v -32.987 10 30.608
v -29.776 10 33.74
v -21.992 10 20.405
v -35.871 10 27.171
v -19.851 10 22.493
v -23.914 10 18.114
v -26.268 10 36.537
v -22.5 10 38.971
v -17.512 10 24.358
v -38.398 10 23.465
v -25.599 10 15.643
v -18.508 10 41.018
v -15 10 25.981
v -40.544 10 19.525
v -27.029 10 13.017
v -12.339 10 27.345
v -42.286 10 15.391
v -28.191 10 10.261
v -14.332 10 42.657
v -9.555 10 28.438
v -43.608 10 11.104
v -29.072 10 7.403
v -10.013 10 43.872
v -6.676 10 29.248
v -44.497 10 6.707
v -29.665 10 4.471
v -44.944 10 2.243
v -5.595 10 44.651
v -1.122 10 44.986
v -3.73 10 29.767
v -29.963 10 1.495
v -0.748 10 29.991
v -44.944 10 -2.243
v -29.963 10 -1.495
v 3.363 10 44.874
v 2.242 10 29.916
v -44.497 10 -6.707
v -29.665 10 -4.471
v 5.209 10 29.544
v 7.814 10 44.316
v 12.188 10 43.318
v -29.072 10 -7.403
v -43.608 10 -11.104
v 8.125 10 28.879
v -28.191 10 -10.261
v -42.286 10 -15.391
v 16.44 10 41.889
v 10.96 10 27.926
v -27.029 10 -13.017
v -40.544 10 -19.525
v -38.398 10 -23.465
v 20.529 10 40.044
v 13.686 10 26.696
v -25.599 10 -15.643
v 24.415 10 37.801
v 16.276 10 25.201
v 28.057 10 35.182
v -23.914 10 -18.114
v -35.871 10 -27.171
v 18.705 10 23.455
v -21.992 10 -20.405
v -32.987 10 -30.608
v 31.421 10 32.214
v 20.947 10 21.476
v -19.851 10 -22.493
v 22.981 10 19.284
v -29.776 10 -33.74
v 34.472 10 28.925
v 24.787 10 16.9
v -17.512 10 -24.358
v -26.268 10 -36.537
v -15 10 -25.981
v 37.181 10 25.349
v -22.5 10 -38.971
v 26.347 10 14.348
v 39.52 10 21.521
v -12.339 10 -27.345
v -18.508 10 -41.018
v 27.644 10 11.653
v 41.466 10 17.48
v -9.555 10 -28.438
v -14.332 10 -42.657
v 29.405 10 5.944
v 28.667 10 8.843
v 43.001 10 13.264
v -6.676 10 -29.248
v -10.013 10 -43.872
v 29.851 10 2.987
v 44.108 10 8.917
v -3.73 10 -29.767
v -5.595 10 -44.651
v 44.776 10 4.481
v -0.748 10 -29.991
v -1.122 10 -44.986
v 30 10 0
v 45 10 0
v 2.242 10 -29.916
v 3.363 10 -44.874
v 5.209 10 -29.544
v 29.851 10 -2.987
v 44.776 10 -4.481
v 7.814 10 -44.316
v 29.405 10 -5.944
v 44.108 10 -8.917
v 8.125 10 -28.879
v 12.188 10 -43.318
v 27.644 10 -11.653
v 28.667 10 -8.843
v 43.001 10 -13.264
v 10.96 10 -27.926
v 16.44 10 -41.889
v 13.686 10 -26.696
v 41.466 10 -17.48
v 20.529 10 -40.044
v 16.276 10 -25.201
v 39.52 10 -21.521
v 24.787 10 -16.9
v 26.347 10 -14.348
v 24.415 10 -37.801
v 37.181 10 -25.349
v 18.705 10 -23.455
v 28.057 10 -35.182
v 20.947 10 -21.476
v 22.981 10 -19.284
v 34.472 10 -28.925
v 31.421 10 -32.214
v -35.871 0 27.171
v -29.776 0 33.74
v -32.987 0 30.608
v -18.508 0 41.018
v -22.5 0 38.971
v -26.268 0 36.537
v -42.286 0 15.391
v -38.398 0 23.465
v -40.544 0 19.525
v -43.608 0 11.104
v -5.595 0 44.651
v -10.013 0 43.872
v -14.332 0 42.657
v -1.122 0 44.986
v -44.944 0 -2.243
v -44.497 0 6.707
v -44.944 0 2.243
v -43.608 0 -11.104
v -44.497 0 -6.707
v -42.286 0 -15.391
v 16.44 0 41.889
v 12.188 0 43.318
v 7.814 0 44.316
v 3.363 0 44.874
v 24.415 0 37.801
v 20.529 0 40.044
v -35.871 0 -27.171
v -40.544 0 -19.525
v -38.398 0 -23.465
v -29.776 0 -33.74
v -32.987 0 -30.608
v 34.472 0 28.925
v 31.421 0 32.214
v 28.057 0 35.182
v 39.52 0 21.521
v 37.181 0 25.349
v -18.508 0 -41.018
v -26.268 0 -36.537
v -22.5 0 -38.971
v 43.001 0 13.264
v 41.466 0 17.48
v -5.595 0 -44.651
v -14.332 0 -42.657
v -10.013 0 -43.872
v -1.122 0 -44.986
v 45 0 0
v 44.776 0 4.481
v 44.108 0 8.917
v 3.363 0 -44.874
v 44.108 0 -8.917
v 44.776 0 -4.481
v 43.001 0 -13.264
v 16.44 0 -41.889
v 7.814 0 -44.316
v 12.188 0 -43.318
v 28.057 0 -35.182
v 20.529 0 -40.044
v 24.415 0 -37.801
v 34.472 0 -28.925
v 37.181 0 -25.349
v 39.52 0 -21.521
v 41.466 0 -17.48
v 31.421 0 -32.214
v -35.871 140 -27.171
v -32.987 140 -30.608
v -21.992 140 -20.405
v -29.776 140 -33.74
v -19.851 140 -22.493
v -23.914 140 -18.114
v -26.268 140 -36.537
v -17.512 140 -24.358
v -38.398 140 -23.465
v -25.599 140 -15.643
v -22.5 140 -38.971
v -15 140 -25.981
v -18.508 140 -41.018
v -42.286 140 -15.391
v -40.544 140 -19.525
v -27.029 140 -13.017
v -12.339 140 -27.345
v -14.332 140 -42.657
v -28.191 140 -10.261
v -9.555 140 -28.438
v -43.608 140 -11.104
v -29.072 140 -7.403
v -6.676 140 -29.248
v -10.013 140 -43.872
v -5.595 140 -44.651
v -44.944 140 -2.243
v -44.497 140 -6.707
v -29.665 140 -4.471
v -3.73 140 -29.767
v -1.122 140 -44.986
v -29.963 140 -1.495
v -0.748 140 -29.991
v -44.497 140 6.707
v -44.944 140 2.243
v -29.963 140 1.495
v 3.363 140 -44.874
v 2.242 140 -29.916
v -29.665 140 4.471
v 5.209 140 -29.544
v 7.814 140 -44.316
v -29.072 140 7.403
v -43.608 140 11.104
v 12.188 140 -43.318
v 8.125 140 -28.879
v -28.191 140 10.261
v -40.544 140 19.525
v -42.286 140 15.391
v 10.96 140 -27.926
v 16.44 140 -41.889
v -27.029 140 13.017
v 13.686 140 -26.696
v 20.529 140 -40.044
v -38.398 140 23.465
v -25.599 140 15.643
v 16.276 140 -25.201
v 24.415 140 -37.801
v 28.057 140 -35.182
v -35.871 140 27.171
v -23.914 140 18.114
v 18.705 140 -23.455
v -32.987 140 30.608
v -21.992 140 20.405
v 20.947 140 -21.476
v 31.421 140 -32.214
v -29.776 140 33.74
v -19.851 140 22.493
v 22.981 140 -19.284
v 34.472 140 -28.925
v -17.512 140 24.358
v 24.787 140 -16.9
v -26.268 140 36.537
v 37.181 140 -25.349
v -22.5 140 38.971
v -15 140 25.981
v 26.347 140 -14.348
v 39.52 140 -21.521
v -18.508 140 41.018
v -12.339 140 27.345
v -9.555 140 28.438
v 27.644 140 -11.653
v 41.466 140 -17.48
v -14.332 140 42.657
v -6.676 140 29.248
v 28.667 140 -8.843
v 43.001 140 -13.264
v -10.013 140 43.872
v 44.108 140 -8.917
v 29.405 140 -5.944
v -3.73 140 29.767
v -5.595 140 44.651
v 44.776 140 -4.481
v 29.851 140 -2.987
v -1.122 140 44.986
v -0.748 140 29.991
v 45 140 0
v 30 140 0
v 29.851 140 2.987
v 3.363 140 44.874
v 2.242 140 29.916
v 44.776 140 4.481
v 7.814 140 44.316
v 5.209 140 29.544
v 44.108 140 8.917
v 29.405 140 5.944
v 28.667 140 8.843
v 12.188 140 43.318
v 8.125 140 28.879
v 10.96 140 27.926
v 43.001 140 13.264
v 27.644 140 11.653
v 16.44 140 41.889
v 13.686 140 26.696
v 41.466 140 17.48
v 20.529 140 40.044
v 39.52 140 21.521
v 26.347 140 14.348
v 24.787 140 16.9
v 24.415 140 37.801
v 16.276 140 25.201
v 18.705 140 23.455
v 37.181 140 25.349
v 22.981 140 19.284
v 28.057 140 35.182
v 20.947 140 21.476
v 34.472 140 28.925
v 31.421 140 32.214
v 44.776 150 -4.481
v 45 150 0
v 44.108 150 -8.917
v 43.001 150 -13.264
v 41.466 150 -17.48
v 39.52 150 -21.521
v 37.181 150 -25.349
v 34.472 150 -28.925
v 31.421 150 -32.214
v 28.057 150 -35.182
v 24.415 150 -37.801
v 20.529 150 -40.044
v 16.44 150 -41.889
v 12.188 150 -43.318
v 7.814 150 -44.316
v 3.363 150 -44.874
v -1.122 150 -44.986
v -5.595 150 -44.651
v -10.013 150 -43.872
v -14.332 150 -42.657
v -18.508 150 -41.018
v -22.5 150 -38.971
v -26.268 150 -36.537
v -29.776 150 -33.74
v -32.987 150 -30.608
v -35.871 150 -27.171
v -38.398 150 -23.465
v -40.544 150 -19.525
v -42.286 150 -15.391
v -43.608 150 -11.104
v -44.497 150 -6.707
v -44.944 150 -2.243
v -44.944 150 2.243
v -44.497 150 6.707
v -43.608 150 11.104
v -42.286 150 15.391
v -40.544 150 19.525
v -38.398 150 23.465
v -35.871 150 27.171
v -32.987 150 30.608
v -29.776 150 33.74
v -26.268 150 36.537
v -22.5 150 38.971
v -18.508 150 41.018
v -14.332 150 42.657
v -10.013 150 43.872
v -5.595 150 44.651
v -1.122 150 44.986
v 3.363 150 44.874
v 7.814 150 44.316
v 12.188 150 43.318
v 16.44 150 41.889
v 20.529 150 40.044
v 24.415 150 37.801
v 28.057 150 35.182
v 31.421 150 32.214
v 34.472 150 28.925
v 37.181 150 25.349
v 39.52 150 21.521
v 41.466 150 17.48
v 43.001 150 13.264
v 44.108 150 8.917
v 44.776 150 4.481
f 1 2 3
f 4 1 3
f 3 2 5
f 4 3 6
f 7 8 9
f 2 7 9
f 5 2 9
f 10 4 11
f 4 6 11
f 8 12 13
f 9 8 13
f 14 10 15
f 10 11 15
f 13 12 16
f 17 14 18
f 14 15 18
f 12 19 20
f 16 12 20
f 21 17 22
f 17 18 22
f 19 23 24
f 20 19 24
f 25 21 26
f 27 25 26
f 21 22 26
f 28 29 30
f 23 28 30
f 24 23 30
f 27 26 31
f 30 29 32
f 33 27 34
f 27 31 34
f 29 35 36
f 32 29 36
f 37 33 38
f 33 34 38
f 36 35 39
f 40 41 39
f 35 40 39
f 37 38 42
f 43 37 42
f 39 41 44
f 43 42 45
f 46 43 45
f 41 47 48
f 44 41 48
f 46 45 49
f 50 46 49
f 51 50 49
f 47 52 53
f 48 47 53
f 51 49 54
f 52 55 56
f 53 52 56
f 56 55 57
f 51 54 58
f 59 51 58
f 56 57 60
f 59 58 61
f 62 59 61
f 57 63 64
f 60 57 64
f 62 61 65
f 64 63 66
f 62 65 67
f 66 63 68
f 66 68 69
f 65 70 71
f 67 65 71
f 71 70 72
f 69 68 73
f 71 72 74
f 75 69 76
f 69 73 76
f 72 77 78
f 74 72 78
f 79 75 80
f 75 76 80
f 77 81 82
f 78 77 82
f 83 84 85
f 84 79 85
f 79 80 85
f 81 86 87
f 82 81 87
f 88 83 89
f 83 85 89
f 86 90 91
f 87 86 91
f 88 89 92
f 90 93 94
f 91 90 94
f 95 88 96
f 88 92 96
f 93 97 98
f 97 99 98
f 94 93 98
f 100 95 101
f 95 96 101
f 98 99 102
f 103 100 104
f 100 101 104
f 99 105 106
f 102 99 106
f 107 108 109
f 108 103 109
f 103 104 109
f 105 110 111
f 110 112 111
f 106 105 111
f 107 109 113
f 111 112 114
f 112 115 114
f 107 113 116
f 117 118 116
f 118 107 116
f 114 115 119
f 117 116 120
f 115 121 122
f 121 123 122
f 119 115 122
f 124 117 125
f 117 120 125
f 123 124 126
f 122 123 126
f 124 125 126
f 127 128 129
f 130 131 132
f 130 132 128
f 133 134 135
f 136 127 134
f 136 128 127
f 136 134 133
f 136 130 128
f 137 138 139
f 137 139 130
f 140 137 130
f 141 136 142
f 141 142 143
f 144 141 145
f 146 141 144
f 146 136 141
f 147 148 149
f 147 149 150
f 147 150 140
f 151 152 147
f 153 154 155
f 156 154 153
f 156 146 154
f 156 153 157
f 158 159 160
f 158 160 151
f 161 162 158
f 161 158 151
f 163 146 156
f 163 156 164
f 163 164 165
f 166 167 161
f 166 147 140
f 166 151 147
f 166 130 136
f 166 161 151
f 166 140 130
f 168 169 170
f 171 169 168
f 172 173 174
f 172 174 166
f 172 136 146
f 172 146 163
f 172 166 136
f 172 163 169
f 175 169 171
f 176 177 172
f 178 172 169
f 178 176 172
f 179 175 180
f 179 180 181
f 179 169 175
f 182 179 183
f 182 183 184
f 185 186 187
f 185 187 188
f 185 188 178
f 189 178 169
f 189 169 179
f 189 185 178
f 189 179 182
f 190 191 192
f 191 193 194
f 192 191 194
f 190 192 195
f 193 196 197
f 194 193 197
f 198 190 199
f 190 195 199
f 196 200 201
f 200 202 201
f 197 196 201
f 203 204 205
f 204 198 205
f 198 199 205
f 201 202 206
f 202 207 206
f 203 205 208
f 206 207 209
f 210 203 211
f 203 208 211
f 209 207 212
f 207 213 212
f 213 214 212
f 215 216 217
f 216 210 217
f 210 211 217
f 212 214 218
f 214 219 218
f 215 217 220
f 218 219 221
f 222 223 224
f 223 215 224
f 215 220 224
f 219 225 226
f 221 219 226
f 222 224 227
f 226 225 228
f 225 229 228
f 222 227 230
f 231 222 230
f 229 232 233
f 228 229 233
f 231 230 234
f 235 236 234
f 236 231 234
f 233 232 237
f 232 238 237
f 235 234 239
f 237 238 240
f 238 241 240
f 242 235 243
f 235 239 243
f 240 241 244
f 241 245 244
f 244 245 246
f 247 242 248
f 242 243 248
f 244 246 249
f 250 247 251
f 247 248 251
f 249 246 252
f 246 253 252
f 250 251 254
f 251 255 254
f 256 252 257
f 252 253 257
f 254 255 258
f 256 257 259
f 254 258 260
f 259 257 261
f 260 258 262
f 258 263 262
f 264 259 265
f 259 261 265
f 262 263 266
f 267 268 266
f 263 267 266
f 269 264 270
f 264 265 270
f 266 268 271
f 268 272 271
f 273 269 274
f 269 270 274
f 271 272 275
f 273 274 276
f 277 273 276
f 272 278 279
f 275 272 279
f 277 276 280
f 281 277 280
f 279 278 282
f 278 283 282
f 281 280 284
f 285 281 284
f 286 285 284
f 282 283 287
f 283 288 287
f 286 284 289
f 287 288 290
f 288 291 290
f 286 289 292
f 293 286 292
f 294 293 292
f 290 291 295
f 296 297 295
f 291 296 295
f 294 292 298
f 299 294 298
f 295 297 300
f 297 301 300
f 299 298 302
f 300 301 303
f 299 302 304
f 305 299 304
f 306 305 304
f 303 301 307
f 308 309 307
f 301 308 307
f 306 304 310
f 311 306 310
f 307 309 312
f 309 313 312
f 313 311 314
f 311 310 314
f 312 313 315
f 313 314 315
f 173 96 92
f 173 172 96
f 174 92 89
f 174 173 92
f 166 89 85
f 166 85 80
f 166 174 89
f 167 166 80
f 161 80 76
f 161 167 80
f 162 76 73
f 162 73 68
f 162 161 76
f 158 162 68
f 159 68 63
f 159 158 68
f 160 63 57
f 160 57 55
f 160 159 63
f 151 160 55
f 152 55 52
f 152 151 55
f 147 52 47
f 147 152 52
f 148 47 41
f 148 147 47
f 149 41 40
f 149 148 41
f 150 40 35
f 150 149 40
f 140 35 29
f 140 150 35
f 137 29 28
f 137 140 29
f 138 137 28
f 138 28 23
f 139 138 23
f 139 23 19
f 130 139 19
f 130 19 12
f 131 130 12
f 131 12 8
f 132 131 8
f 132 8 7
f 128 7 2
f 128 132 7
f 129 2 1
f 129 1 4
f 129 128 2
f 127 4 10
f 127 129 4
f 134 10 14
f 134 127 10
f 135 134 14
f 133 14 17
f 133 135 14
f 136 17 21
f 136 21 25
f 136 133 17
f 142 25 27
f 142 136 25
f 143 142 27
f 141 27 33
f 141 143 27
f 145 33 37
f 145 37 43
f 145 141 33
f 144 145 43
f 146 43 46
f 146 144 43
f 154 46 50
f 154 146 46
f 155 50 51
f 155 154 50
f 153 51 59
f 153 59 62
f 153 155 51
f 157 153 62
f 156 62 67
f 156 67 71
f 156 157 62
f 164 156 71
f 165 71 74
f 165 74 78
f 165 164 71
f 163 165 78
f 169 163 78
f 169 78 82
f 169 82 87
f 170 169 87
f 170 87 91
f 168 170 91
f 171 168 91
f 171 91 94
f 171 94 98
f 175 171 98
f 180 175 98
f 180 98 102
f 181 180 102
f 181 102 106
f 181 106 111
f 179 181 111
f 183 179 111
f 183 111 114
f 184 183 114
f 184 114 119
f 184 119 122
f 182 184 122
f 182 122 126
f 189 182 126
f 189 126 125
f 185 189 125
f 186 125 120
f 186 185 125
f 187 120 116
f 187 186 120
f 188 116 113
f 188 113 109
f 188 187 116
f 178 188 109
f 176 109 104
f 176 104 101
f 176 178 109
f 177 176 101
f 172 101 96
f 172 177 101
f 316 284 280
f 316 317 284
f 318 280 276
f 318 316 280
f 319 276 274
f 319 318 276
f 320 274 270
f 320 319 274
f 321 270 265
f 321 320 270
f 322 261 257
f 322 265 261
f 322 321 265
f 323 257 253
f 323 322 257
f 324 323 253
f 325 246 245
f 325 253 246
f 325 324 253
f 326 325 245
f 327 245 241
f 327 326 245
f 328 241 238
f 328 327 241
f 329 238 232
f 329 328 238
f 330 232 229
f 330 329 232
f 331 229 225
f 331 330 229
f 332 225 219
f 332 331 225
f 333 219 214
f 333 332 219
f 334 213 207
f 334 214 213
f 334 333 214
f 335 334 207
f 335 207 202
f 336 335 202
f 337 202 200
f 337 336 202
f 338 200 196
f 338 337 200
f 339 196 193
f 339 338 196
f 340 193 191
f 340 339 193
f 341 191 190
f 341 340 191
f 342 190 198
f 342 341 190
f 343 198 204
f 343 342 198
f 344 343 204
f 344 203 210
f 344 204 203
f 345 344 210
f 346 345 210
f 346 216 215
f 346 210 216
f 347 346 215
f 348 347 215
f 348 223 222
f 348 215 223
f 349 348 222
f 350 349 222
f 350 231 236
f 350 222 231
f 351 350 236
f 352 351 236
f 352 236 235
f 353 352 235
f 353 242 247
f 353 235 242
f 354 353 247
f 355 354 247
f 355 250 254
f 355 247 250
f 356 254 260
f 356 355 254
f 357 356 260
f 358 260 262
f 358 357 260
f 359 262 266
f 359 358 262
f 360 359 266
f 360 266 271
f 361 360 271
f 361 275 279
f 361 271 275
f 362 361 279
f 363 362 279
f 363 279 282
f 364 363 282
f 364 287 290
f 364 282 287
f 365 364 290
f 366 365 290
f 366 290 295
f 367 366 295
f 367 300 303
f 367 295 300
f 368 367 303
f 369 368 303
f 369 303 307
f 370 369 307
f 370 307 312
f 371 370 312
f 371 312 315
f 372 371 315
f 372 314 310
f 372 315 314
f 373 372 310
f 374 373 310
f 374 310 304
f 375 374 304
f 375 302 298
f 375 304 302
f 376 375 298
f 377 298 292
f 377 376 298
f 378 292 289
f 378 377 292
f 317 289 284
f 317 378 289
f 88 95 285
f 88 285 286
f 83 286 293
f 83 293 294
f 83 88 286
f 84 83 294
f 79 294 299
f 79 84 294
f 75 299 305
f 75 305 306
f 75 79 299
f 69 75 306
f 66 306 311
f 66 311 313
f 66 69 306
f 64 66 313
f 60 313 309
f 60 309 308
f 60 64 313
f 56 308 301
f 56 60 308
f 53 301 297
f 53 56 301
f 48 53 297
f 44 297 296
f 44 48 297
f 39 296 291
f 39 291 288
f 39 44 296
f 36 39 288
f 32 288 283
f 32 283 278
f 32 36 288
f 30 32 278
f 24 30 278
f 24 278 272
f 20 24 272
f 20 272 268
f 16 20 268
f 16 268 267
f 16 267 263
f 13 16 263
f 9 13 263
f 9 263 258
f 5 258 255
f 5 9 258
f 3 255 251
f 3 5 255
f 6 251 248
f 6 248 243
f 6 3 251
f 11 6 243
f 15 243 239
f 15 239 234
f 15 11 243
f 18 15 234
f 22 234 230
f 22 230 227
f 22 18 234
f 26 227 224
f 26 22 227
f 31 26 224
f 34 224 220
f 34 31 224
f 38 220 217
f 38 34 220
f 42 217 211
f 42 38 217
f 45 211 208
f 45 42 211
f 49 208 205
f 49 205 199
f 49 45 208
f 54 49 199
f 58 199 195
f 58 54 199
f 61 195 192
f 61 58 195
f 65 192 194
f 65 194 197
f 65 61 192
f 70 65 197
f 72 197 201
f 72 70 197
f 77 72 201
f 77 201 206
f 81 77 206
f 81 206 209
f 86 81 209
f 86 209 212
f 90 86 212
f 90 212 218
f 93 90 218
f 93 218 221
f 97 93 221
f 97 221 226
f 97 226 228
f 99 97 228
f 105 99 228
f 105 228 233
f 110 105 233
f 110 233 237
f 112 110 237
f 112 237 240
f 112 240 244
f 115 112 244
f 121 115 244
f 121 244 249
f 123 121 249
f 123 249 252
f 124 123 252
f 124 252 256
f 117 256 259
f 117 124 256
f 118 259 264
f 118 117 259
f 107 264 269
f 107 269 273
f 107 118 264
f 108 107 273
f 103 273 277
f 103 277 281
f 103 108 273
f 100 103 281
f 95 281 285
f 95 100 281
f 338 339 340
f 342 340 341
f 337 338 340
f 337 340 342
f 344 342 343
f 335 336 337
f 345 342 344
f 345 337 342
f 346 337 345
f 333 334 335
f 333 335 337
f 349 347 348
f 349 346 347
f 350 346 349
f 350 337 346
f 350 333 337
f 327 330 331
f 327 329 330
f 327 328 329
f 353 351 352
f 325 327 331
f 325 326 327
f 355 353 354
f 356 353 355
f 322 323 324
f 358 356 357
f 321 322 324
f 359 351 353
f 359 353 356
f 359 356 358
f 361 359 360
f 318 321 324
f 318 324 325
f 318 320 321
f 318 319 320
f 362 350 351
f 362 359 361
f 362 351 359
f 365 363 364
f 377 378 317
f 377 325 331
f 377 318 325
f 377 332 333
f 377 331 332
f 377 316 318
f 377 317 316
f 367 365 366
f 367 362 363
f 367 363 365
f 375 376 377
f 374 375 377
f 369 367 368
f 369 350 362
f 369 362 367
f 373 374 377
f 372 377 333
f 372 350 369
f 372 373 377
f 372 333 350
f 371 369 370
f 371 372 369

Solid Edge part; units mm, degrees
sketch "Sketch1" plane through (0, 0, 0) normal (0, -1, 0) x (1, 0, 0)
  circle A0 centre (0, 0) radius 30
extrude "Protrusion1" add sketch "Sketch1" against normal blind 150
sketch "Sketch2" plane through (0, 0, 0) normal (0, -1, 0) x (1, 0, 0)
  circle A0 centre (0, 0) radius 45
  dimension "D1" = 90
extrude "ExtrudedProtrusion_2" add sketch "Sketch2" against normal blind 10
mirror "Mirror1" about plane through (0, 75, 0) normal (0, -1, 0) of "ExtrudedProtrusion_2"
